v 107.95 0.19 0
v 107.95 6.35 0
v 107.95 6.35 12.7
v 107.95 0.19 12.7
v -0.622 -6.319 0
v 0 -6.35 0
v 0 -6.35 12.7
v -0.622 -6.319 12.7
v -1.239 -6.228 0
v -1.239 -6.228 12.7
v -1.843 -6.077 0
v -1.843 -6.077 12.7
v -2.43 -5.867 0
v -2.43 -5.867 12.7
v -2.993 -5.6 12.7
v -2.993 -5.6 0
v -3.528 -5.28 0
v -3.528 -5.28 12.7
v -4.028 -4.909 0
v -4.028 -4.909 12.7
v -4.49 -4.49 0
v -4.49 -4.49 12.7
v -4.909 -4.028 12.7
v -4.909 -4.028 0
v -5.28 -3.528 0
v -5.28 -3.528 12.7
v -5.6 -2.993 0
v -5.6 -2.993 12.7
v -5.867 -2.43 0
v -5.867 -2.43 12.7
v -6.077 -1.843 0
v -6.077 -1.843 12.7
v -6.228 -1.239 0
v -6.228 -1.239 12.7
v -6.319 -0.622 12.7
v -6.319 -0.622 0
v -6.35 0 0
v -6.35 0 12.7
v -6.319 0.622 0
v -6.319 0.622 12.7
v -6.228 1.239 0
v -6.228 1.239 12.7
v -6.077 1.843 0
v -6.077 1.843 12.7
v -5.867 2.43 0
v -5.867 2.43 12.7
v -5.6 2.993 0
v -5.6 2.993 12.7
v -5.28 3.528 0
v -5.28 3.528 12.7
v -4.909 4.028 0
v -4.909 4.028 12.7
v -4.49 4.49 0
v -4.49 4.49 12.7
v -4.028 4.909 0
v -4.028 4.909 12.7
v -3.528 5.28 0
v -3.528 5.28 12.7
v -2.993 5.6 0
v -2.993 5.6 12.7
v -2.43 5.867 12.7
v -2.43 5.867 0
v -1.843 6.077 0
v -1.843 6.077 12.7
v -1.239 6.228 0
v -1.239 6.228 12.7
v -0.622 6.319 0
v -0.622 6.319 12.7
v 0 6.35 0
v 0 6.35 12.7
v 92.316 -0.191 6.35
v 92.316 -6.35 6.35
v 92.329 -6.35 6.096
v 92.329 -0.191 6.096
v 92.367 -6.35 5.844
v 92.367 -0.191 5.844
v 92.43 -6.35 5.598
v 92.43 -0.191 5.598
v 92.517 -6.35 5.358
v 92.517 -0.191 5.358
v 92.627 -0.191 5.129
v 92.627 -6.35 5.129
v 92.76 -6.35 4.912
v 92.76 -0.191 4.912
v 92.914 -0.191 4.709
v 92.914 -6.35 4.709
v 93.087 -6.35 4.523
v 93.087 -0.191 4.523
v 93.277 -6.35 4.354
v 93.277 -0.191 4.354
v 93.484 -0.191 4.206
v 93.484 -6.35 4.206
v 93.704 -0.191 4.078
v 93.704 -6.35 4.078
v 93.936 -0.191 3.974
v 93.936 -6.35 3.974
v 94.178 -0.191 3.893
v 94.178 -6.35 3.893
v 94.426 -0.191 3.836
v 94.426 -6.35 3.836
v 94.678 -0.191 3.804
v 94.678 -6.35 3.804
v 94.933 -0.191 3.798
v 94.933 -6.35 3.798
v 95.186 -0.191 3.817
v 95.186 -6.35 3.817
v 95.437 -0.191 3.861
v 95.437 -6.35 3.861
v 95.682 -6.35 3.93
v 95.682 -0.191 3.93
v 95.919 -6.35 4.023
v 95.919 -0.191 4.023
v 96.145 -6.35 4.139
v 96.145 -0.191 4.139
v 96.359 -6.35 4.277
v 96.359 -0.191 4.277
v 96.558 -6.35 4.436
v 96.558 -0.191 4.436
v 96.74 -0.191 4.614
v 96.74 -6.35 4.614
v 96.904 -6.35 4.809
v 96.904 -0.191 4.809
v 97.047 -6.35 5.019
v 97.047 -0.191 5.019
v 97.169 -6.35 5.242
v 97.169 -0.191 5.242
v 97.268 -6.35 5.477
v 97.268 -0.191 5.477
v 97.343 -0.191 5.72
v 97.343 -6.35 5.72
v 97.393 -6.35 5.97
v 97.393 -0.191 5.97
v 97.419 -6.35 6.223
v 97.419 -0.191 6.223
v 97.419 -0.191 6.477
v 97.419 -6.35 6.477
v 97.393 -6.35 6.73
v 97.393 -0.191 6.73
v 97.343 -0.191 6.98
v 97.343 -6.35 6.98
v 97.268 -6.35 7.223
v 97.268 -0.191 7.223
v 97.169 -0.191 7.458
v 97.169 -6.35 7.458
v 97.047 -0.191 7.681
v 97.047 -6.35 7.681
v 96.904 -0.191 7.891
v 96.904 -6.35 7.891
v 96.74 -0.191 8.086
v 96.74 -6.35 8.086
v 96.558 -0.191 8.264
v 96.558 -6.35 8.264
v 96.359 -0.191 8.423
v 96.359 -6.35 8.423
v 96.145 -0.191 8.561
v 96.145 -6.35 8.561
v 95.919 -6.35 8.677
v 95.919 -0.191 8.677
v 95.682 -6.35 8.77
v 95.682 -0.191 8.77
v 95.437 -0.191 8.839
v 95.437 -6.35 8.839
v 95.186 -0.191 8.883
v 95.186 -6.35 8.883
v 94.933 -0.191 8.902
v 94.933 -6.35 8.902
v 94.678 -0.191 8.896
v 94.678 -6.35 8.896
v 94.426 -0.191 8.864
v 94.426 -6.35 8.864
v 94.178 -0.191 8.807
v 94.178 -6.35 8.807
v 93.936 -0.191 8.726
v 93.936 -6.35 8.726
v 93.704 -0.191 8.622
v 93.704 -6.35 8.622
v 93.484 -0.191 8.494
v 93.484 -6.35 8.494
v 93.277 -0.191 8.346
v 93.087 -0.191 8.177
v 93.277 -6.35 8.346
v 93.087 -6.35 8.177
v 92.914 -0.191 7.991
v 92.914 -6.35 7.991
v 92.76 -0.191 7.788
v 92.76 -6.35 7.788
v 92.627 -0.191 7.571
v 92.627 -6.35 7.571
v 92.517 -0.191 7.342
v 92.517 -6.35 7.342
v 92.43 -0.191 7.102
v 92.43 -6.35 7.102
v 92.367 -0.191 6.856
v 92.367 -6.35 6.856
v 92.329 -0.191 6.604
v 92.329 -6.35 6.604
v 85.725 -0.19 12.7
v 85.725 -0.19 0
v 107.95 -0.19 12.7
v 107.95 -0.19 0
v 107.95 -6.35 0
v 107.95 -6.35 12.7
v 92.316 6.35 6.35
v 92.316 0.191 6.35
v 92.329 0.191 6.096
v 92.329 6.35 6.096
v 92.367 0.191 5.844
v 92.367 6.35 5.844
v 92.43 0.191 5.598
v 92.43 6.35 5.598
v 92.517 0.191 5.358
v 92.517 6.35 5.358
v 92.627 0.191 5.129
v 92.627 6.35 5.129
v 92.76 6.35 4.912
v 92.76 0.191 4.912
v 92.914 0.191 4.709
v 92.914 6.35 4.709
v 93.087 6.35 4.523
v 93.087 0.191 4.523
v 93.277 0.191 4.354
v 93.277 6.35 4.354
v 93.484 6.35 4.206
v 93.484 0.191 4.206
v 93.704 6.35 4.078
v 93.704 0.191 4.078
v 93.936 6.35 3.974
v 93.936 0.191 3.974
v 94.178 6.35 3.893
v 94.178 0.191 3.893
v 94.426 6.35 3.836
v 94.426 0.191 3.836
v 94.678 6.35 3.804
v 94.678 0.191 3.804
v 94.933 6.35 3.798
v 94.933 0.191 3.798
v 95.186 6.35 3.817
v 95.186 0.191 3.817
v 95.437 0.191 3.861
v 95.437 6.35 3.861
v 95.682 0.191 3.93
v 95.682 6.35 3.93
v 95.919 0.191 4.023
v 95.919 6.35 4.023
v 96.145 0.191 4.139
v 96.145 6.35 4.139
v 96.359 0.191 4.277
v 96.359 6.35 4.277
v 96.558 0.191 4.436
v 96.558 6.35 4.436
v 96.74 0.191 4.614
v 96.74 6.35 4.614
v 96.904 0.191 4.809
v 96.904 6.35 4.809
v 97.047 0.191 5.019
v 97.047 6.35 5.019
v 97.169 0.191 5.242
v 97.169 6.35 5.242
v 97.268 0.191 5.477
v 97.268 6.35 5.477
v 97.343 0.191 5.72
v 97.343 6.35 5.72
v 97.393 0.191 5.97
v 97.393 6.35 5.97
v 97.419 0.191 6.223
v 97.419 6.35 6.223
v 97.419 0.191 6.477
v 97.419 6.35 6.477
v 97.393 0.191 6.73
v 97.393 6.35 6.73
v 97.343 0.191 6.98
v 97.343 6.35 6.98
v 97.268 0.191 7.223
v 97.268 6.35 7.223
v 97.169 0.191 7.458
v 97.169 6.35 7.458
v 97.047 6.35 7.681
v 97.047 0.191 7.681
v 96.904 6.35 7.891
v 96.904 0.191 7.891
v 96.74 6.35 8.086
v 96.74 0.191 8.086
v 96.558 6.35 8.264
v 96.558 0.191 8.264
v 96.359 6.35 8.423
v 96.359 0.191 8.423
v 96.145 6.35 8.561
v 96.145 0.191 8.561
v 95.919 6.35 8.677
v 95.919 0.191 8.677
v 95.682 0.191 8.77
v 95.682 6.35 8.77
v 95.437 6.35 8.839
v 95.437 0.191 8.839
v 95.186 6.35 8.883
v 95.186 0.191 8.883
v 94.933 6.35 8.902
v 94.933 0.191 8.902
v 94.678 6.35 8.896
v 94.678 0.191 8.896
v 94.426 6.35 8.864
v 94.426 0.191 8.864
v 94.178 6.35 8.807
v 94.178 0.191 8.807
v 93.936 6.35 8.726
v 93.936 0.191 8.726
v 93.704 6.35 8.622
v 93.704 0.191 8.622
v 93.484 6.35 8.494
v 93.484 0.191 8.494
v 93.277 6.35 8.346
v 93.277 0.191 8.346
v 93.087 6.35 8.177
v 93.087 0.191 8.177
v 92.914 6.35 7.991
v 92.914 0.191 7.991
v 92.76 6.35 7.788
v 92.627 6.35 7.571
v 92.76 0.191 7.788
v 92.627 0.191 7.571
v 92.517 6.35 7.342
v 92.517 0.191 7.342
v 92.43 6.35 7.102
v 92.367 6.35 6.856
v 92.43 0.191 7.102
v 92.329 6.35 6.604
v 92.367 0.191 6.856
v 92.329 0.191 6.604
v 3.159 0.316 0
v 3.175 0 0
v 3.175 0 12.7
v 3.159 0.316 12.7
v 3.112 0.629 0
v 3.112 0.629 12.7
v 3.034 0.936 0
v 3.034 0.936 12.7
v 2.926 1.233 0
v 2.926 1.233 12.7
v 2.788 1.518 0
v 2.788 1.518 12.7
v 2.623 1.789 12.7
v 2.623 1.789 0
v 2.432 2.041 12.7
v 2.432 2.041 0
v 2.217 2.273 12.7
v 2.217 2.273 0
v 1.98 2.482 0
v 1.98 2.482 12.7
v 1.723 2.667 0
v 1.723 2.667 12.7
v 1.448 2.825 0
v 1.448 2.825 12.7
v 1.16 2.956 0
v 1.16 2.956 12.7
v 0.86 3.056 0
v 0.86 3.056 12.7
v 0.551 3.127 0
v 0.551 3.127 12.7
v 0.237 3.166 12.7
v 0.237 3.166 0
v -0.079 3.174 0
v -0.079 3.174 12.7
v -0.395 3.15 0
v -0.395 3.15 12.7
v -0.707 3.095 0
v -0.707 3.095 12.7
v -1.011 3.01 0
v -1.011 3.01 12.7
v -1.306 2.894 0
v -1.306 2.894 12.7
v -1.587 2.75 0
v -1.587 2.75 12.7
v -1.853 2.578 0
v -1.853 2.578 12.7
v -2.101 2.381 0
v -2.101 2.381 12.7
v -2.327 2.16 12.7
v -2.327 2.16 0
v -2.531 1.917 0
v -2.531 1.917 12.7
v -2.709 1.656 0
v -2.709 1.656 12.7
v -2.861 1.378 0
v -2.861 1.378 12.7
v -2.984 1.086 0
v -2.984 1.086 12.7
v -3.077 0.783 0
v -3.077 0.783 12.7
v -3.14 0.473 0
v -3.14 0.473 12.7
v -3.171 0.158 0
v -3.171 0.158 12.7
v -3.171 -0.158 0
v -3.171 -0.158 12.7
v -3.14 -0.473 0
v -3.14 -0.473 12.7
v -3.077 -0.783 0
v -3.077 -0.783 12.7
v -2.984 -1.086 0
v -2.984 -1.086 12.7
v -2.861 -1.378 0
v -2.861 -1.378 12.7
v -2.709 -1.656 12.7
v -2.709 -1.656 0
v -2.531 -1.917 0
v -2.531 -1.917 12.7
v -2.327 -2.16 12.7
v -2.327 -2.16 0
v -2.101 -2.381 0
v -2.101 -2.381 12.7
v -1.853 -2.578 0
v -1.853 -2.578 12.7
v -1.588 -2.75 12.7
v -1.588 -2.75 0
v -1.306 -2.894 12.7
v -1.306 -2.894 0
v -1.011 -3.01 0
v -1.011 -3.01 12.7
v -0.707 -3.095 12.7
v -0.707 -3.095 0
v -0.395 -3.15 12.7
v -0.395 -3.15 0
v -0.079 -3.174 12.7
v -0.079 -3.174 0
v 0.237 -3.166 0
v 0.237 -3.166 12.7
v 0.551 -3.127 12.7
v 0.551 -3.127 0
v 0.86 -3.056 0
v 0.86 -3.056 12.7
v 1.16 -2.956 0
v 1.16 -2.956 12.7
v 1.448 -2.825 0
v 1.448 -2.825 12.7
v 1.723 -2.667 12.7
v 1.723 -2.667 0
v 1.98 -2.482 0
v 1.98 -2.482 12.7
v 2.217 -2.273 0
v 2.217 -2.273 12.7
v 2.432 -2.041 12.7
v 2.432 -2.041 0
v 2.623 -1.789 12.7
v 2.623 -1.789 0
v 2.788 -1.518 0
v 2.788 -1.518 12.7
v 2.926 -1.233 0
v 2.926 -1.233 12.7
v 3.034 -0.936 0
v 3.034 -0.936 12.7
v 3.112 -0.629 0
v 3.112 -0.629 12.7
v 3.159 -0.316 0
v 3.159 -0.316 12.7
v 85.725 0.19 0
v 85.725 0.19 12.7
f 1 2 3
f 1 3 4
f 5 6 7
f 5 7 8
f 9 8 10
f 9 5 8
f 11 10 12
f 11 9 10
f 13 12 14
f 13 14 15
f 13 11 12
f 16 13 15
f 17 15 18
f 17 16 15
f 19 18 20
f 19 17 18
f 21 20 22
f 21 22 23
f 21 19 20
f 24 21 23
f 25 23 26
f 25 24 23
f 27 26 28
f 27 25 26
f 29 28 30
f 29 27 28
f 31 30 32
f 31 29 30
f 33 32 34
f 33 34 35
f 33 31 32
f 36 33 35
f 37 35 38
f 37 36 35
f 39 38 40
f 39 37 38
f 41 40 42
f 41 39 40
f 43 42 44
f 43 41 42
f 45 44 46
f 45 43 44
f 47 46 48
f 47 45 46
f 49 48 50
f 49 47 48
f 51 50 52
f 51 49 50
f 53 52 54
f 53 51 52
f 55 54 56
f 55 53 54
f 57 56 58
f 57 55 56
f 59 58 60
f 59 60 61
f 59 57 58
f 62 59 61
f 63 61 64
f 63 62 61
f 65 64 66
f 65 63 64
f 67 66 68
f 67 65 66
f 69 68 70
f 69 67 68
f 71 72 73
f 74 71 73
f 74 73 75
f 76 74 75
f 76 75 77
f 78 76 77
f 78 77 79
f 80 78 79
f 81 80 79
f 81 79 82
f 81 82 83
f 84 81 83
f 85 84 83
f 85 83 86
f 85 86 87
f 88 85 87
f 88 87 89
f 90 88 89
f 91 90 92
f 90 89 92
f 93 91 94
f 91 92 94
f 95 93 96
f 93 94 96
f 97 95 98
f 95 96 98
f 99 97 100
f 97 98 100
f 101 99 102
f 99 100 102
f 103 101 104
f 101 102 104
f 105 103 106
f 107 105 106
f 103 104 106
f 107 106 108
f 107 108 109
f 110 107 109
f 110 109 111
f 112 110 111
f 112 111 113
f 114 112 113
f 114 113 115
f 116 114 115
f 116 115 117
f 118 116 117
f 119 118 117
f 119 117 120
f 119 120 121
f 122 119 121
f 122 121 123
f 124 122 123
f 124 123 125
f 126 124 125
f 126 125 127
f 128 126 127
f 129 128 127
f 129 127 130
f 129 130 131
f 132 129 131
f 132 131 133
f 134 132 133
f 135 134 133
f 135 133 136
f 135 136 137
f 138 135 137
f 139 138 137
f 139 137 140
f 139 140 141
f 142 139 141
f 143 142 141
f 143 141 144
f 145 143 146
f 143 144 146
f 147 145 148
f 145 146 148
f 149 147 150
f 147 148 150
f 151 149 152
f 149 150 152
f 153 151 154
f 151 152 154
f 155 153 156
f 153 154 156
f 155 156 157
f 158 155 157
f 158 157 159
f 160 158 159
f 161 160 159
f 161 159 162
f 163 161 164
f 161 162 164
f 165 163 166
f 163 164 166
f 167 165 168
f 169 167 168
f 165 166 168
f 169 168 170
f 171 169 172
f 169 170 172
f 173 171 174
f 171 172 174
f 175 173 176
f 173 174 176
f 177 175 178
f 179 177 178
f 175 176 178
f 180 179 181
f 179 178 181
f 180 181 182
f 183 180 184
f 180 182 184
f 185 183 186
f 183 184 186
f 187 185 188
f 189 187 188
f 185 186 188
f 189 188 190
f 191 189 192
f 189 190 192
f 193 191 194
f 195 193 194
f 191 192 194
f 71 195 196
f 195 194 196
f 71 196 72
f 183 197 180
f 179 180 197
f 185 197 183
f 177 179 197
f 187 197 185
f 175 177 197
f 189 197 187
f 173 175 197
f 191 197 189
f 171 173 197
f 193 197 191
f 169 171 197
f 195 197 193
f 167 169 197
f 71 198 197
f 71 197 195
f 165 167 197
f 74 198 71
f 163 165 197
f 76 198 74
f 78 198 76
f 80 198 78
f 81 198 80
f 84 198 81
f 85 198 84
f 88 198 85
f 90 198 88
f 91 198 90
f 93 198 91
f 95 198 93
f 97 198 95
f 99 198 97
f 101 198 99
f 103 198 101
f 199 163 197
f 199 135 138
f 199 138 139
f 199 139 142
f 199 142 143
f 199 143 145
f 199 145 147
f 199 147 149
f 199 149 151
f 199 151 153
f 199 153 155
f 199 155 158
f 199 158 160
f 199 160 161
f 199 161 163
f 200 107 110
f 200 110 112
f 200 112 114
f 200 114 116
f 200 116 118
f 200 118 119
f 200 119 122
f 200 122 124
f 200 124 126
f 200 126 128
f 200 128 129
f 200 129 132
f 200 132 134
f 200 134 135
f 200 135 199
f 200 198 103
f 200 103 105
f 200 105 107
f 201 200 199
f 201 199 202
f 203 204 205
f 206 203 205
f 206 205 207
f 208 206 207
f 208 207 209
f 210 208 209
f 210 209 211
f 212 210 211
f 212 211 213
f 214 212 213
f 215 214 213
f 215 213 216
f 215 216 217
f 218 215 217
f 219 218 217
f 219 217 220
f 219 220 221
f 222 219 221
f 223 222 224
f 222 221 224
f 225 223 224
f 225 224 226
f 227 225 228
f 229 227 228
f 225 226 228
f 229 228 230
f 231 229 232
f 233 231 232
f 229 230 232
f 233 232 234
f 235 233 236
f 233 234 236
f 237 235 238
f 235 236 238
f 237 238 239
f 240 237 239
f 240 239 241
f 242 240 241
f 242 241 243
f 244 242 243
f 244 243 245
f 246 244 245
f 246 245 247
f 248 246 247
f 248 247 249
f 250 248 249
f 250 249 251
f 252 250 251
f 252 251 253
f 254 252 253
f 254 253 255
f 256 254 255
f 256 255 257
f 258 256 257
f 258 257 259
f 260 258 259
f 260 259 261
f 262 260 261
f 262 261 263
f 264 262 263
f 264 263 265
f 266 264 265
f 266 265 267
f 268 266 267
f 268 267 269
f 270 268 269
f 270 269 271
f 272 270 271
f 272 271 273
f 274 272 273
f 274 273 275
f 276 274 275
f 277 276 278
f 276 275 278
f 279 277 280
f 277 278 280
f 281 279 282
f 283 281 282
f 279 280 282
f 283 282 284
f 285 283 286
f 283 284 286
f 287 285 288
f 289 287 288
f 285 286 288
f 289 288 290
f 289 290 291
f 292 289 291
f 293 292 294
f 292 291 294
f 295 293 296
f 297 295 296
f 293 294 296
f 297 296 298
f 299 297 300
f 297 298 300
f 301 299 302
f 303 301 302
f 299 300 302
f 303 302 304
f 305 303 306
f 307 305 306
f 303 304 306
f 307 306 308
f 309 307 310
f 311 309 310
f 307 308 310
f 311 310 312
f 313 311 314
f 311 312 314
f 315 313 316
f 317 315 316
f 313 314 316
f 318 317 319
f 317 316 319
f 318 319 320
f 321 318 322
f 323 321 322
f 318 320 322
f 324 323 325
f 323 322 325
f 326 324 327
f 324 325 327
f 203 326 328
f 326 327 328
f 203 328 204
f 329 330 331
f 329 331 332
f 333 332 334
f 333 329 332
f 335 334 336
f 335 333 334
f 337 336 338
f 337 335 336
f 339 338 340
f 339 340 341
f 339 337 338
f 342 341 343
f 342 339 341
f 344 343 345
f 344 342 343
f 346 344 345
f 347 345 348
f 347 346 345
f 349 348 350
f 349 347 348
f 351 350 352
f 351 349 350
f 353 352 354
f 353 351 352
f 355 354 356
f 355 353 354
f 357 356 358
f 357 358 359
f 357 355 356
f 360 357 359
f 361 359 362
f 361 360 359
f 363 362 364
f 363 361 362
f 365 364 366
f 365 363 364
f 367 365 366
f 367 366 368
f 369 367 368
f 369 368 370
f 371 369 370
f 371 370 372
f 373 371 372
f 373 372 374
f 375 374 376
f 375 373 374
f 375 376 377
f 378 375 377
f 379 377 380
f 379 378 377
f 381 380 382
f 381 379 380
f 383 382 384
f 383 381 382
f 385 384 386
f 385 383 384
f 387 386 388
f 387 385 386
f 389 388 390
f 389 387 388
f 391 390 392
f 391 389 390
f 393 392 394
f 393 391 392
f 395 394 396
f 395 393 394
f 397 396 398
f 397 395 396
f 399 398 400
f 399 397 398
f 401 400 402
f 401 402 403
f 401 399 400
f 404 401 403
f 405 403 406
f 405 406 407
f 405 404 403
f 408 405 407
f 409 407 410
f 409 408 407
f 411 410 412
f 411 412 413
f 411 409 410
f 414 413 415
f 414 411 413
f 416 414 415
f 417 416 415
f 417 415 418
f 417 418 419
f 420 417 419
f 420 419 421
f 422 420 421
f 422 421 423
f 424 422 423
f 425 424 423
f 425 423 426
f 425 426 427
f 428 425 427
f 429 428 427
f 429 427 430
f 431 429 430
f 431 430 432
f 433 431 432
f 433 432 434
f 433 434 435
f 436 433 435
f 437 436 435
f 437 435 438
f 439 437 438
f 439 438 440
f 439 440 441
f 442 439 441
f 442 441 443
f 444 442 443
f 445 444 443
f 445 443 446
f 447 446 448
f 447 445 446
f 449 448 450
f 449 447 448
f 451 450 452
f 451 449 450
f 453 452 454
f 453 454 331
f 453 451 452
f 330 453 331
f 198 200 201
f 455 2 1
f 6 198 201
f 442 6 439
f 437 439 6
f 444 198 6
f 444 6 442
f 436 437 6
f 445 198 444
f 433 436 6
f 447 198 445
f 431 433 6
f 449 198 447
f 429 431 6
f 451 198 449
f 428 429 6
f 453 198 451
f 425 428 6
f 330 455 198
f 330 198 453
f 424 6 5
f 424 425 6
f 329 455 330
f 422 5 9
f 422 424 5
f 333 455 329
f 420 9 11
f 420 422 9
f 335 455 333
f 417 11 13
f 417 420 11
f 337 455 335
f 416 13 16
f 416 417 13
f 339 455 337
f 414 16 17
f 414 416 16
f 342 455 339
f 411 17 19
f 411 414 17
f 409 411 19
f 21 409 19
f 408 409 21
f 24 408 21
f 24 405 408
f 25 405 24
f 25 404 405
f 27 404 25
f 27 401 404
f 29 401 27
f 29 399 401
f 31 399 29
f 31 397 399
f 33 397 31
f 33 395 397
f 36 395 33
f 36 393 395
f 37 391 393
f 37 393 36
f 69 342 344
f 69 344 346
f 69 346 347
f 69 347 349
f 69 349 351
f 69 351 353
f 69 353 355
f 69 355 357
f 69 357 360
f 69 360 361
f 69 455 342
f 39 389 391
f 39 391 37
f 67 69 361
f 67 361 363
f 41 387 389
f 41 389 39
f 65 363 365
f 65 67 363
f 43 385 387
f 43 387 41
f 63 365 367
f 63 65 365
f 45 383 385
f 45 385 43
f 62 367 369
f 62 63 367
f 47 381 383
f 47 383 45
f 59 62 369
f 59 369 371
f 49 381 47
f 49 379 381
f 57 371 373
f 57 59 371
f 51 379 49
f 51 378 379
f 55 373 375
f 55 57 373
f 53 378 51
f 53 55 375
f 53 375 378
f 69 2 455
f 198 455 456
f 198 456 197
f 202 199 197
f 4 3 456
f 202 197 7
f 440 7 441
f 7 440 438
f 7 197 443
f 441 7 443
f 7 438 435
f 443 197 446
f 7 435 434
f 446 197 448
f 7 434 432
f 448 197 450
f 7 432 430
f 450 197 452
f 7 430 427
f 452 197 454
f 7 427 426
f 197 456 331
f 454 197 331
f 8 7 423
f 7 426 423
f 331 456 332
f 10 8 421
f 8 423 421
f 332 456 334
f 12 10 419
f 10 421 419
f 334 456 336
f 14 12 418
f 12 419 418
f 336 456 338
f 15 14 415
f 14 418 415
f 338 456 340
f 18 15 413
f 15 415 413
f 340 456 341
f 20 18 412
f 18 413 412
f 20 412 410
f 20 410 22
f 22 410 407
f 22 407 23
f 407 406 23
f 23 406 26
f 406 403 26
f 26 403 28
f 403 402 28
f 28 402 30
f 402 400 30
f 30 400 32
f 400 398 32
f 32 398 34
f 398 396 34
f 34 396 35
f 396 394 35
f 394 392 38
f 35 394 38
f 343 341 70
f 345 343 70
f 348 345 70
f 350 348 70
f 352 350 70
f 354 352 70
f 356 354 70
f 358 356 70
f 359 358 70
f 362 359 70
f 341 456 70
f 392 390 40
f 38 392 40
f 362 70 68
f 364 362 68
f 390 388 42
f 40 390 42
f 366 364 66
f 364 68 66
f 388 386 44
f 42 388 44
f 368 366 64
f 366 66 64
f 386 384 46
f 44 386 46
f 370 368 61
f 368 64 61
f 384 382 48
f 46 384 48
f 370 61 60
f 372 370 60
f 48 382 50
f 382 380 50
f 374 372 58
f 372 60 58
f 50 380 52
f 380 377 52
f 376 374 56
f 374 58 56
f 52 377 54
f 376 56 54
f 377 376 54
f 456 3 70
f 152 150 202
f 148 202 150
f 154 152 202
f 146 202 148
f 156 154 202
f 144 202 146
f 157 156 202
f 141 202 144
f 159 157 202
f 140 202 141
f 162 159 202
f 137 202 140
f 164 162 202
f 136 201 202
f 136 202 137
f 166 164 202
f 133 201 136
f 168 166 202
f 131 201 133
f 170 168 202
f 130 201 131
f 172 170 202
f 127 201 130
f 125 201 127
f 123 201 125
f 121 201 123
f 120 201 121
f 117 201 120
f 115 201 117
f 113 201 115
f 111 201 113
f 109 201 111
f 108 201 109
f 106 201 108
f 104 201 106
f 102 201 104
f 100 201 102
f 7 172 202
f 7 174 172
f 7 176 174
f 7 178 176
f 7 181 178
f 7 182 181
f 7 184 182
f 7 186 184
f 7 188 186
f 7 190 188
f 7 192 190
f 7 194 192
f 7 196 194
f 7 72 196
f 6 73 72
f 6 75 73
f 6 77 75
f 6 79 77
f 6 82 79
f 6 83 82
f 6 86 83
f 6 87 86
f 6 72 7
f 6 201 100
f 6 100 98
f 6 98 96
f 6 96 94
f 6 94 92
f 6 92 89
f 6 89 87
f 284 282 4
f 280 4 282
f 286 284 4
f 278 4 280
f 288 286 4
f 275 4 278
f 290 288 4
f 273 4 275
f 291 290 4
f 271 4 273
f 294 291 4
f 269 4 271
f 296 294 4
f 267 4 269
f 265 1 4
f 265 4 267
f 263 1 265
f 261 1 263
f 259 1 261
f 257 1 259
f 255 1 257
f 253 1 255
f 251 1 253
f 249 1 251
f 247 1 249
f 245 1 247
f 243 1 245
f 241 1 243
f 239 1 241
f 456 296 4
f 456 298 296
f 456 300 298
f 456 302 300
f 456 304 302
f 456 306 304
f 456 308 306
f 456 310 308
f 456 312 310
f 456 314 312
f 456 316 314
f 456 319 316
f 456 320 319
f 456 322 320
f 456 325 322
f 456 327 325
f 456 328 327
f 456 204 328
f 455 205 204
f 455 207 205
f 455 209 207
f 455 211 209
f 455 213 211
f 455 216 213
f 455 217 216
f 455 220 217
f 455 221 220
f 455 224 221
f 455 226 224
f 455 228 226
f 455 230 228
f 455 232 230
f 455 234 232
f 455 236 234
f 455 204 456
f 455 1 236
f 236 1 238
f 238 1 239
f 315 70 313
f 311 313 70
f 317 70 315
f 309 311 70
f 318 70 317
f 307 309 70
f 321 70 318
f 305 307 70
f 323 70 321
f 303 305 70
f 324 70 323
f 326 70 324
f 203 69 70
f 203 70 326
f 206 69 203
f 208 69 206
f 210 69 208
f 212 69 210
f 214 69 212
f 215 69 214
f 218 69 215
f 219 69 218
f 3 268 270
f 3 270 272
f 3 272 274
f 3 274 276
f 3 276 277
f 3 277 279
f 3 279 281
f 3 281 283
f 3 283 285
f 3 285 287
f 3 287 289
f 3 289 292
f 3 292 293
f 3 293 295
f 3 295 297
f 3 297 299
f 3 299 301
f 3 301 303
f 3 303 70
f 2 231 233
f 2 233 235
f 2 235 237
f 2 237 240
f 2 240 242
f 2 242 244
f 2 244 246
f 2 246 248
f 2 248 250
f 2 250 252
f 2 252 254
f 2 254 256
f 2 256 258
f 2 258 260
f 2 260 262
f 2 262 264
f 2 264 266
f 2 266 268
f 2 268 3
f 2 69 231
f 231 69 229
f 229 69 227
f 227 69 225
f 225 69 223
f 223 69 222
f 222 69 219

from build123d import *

# Parameters (mm, degrees)
SKETCH1_R              = 3.175
BOSS_EXTRUDE1_DEPTH    = 12.7
F_10_CLEARANCE_HOLE2_D = 5.1054


with BuildPart() as part:
    # Sketch1 → Boss-Extrude1 (new body)
    with BuildSketch(Plane.XY):
        with BuildLine():
            Line((85.725, 0.1905), (85.725, -0.1905))
            Line((85.725, -0.1905), (107.95, -0.1905))
            Line((107.95, -0.1905), (107.95, -6.35))
            Line((107.95, -6.35), (7.14e-07, -6.35))
            ThreePointArc((7.14e-07, -6.35), (-6.35, -3.57e-07), (0, 6.35))
            Line((0, 6.35), (107.95, 6.35))
            Line((107.95, 6.35), (107.95, 0.1905))
            Line((107.95, 0.1905), (85.725, 0.1905))
        make_face()
        Circle(SKETCH1_R, mode=Mode.SUBTRACT)
    extrude(amount=BOSS_EXTRUDE1_DEPTH)

    # #10 Clearance Hole2 (through all)
    with Locations(Plane(origin=(0, 6.35, 0), x_dir=(1, 0, 0), z_dir=(0, 1, 0))):
        with Locations((94.869, -6.35)):
            Hole(F_10_CLEARANCE_HOLE2_D / 2)


solid = part.part
